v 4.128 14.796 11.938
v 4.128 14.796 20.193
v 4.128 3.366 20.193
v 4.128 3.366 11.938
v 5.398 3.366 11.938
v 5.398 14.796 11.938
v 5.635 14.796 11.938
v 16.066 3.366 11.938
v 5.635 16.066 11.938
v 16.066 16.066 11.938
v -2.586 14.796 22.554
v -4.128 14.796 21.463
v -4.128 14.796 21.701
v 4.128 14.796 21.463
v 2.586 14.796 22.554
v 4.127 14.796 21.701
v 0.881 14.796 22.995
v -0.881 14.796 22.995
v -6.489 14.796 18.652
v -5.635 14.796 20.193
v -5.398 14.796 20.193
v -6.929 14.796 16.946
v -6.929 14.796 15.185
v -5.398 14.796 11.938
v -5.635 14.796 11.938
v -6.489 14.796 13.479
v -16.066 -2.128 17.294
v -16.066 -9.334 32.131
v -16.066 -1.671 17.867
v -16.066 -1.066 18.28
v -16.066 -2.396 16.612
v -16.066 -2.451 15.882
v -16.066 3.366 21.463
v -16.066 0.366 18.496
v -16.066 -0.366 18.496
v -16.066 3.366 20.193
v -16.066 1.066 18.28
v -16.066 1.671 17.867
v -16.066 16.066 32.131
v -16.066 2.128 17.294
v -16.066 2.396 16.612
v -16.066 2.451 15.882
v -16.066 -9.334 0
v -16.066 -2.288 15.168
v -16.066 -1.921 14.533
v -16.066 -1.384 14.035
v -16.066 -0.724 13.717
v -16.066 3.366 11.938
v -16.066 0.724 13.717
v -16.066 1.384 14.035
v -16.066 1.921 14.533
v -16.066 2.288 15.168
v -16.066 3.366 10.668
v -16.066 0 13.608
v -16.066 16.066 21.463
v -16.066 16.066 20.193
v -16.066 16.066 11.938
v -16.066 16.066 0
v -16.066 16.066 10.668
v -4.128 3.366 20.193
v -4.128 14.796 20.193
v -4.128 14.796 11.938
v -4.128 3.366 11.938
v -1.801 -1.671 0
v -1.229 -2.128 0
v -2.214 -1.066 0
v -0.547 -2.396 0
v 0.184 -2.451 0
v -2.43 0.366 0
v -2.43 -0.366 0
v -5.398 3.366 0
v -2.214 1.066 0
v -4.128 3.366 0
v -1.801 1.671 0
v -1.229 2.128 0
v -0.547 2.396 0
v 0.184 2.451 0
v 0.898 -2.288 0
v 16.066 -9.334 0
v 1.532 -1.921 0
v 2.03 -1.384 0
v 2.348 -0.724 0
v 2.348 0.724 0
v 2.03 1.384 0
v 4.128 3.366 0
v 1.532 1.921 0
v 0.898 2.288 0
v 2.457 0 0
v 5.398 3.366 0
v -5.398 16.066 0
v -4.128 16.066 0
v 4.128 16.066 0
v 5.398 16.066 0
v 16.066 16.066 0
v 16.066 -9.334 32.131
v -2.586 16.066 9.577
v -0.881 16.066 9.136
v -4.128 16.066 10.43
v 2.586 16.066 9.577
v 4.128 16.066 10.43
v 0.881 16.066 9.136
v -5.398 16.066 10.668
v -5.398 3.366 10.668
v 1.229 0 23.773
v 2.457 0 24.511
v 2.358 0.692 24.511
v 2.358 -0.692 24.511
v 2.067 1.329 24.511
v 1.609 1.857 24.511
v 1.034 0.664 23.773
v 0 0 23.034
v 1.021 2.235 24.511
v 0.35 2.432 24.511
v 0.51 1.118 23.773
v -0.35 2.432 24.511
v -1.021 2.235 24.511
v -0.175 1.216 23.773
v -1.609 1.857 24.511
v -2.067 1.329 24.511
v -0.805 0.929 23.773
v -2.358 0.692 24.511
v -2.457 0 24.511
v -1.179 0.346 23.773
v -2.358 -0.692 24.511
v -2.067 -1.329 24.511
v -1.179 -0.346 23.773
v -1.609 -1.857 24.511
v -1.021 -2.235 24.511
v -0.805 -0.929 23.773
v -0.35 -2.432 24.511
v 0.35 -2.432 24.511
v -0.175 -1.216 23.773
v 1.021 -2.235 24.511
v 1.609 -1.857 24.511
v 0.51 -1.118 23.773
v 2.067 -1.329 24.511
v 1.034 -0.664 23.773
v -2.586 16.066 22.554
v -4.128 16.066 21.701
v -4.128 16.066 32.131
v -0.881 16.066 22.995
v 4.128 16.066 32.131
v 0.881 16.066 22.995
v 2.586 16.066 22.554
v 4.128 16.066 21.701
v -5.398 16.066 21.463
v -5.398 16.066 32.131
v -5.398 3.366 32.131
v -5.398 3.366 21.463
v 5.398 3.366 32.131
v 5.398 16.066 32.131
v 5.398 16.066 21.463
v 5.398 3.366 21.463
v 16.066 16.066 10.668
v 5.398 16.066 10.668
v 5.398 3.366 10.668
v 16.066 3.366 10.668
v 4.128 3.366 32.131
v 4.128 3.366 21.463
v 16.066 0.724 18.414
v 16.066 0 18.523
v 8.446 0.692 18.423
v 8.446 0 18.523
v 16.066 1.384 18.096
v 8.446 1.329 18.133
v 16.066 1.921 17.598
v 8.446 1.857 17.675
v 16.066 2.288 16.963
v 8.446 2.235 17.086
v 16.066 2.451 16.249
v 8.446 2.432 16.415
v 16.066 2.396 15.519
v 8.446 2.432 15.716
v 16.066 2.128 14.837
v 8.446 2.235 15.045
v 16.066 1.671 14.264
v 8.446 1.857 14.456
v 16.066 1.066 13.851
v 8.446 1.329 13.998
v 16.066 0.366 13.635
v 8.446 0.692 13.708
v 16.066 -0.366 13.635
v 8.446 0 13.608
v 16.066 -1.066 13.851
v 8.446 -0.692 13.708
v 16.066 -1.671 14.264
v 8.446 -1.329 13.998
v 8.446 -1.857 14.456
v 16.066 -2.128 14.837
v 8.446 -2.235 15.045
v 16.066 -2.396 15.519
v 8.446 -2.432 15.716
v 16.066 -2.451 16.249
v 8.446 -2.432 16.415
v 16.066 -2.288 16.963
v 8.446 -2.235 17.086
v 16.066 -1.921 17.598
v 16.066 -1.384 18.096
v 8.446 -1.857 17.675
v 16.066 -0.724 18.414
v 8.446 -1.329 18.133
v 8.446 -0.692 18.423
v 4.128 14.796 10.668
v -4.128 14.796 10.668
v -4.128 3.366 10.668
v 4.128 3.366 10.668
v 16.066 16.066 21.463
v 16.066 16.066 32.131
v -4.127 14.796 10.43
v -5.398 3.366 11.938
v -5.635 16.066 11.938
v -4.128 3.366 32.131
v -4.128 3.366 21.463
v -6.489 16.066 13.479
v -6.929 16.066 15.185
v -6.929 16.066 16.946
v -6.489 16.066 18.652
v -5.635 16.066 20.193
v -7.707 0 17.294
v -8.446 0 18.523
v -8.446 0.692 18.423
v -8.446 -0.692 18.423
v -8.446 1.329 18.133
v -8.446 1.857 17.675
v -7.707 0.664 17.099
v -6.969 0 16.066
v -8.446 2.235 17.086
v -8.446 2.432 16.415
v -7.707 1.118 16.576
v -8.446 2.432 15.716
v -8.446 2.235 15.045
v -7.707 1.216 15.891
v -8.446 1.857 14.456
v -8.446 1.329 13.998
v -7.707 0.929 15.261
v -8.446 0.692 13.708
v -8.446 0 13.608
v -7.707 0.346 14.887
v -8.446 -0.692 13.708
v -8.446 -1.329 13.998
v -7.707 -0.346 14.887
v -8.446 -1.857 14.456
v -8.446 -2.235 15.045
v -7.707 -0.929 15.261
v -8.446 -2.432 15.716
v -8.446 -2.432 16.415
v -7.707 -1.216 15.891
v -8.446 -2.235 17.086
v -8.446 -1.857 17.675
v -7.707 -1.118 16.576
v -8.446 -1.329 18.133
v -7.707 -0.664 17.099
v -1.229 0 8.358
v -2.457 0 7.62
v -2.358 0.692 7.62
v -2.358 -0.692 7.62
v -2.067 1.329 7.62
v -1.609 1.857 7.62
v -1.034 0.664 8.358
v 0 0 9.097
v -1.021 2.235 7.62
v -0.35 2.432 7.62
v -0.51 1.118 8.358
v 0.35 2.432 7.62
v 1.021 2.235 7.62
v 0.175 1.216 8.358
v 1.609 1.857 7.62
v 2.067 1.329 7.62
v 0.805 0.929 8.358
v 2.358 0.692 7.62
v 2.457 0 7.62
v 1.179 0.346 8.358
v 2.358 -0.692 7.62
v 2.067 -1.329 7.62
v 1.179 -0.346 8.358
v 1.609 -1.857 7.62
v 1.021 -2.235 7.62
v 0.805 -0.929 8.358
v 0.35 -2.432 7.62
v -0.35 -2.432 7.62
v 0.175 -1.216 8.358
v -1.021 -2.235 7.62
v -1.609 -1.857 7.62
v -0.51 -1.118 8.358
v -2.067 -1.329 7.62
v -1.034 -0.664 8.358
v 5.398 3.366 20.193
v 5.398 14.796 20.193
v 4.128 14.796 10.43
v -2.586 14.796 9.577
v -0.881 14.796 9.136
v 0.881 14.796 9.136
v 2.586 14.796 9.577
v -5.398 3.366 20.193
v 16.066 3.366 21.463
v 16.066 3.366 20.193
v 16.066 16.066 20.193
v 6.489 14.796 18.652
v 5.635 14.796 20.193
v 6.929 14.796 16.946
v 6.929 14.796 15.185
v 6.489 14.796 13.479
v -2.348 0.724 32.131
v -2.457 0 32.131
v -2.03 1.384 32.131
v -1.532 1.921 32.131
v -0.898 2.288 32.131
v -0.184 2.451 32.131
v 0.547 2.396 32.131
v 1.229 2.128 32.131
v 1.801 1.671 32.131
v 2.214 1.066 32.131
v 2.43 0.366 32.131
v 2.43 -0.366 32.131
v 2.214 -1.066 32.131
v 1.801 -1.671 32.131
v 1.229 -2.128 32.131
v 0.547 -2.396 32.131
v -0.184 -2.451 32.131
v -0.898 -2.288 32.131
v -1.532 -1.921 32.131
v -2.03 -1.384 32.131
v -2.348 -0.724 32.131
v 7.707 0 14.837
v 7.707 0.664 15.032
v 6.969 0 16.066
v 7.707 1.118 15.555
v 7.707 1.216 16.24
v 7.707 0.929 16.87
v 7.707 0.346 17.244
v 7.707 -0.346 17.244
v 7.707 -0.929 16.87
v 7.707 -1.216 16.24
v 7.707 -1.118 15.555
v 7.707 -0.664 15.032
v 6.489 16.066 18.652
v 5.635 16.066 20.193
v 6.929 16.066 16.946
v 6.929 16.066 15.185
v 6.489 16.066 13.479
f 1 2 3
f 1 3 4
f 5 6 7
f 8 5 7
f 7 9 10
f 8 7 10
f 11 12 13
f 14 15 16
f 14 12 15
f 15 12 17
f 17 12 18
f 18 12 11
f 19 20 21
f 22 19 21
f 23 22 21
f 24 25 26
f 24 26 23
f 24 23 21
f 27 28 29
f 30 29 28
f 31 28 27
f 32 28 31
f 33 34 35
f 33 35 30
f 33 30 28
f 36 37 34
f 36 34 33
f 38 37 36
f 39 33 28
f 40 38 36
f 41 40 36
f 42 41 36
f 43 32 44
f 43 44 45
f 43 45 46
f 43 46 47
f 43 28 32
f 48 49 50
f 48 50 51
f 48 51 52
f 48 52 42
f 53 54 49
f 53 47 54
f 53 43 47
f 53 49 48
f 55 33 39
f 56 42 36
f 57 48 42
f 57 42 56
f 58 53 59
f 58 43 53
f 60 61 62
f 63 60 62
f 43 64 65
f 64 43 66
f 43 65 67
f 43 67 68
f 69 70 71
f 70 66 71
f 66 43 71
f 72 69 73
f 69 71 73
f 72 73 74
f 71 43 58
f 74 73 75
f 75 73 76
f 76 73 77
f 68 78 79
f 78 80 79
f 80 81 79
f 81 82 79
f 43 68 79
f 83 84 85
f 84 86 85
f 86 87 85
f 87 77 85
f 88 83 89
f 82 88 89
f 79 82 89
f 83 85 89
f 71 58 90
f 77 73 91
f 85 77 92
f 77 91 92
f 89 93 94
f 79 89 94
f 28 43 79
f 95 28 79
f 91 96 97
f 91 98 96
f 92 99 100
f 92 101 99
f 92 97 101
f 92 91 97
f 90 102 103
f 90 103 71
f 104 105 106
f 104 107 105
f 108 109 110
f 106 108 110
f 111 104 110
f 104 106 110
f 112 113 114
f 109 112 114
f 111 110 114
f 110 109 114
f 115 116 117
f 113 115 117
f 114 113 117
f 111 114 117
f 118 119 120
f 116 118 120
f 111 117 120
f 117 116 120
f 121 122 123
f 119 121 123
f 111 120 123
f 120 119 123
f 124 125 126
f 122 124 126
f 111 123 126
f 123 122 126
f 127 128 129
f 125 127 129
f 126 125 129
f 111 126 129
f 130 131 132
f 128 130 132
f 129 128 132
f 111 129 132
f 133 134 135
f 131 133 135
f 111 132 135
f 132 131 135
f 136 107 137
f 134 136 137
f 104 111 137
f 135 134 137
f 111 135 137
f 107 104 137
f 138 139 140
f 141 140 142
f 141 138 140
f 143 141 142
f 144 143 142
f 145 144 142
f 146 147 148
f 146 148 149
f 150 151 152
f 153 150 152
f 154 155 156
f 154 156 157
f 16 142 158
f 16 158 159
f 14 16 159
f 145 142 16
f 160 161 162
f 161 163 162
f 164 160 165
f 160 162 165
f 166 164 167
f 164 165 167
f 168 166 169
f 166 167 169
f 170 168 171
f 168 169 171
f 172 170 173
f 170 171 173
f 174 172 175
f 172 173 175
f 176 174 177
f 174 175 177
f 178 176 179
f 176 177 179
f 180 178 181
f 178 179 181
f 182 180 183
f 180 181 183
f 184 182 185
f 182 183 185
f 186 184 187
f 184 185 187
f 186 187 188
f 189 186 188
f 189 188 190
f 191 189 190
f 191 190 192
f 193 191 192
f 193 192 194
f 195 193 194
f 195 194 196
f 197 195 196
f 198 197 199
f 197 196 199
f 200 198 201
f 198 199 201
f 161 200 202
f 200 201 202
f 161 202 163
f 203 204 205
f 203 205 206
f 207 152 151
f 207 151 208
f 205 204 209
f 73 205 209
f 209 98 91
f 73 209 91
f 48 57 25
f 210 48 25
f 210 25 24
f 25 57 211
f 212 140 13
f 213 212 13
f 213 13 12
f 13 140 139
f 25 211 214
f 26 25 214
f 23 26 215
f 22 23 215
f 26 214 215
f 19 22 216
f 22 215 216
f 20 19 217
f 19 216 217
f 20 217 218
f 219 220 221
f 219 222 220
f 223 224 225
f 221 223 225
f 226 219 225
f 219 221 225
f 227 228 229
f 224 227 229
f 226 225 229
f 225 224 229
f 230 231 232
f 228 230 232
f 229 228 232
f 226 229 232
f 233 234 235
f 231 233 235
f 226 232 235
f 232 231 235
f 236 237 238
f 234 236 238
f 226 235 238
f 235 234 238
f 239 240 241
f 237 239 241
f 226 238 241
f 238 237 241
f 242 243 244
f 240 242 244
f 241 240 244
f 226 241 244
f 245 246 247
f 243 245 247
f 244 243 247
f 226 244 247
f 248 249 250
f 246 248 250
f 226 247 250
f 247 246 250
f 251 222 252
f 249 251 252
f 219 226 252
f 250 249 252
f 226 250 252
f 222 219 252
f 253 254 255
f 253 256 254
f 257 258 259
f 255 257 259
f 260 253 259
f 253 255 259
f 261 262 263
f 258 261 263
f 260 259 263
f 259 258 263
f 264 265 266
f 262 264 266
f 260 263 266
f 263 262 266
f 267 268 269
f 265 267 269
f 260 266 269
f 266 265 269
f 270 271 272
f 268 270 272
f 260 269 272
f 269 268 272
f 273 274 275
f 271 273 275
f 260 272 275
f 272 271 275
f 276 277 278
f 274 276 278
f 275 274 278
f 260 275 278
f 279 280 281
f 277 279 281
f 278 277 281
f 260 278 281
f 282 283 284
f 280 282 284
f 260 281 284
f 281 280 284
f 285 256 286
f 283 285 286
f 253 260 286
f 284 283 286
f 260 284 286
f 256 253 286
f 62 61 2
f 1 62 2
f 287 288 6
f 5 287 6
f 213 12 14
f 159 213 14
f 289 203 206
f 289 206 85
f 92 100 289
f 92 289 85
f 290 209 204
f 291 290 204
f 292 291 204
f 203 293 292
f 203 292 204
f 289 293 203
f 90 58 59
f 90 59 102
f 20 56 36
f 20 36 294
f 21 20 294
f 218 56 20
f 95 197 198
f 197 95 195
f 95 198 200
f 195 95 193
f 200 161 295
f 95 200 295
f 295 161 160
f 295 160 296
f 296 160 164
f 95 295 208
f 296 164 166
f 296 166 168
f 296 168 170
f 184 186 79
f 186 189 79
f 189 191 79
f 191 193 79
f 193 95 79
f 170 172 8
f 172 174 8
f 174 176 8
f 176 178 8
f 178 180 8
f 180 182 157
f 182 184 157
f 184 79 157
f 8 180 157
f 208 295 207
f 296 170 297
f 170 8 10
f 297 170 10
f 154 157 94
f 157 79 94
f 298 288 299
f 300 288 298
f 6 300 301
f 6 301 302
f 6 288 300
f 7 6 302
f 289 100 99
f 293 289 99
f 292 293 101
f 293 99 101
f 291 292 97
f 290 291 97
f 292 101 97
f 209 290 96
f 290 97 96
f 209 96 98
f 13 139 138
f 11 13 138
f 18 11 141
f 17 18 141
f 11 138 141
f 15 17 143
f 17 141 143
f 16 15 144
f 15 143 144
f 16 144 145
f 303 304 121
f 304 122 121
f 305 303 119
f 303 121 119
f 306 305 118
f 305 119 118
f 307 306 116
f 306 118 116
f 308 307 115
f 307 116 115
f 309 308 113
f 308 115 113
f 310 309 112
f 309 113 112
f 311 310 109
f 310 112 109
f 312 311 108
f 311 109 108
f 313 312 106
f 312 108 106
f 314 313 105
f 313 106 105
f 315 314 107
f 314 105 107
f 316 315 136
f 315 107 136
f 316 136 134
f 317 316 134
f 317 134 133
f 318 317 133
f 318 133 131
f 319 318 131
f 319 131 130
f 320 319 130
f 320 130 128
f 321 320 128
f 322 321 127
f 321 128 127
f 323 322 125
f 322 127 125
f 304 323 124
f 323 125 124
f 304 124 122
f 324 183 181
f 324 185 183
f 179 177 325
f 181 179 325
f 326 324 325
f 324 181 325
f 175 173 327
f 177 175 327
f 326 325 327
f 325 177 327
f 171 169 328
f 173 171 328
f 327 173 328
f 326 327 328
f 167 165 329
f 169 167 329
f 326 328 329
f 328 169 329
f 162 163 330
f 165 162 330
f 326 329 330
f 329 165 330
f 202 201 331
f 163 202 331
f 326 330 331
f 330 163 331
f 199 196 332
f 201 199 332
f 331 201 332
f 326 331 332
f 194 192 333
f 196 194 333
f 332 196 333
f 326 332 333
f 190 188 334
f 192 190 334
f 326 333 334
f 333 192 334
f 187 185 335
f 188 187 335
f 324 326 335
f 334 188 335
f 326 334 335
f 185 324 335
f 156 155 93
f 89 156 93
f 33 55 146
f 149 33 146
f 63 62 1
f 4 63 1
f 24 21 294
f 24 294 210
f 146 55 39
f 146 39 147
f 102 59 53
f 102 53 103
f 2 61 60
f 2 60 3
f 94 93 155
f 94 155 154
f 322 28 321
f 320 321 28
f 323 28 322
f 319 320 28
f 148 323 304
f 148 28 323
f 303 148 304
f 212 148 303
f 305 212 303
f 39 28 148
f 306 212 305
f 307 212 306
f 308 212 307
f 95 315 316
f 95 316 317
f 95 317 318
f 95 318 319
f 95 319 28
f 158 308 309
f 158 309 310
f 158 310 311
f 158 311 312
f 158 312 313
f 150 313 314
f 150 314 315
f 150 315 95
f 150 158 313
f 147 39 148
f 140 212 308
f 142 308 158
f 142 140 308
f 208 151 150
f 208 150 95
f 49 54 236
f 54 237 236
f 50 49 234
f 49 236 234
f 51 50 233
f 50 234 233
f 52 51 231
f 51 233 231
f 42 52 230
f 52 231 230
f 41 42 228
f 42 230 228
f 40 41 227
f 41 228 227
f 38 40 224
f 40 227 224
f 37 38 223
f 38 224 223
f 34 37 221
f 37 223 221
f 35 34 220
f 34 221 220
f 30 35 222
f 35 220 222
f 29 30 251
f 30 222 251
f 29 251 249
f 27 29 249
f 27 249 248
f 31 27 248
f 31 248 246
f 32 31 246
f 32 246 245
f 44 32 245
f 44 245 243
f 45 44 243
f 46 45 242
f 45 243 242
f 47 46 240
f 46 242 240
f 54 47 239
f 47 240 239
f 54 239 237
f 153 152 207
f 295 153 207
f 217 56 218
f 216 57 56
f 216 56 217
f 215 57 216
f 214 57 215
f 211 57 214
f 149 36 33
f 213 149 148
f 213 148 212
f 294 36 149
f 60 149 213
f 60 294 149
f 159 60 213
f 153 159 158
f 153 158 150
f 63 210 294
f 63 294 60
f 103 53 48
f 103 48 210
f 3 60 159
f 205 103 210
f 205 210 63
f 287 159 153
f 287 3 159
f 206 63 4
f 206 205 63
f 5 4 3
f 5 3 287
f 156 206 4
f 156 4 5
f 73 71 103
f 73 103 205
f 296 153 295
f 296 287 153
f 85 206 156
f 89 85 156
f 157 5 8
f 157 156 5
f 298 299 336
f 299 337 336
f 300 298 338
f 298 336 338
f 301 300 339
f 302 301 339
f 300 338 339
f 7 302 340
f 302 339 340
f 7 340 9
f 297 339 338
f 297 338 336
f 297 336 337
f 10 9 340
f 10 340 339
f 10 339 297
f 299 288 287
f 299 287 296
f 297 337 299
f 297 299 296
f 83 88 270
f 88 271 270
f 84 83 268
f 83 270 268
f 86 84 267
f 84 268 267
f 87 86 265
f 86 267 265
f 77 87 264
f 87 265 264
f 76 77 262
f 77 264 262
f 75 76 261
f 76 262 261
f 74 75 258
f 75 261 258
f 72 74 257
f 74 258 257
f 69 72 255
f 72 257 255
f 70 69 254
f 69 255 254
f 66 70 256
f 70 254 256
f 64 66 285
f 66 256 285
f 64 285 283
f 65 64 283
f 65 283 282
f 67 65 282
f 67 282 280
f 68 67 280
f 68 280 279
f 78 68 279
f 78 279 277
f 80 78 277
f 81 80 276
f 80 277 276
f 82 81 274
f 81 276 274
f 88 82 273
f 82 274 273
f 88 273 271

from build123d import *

# Parameters (mm, degrees)
SKETCH1_W                        = 32.131
SKETCH1_H                        = 25.4
BOSS_EXTRUDE1_DEPTH              = 32.131
SKETCH2_W                        = 1.27
SKETCH2_H                        = 32.131
SKETCH2_W_2                      = 32.131
SKETCH2_H_2                      = 1.27
CUT_EXTRUDE1_DEPTH               = 12.7
SKETCH3_R                        = 6.985
CUT_EXTRUDE2_DEPTH               = 1.27
F_10_0_1935_DIAMETER_HOLE6_D     = 4.9149
F_10_0_1935_DIAMETER_HOLE6_DEPTH = 7.62
F_10_0_1935_DIAMETER_HOLE6_TIP   = 1.476584928
F_10_0_1935_DIAMETER_HOLE7_D     = 4.9149
F_10_0_1935_DIAMETER_HOLE7_DEPTH = 7.62
F_10_0_1935_DIAMETER_HOLE7_TIP   = 1.476584928
F_10_0_1935_DIAMETER_HOLE8_D     = 4.9149
F_10_0_1935_DIAMETER_HOLE8_DEPTH = 7.62
F_10_0_1935_DIAMETER_HOLE8_TIP   = 1.476584928
F_10_0_1935_DIAMETER_HOLE9_D     = 4.9149
F_10_0_1935_DIAMETER_HOLE9_DEPTH = 7.62
F_10_0_1935_DIAMETER_HOLE9_TIP   = 1.476584928


with BuildPart() as part:
    # Sketch1 → Boss-Extrude1 (new body)
    with BuildSketch(Plane.XY):
        with Locations((0, 3.3655)):
            Rectangle(SKETCH1_W, SKETCH1_H)
    extrude(amount=BOSS_EXTRUDE1_DEPTH)

    # Sketch2 → Cut-Extrude1 (cut)
    with BuildSketch(Plane(origin=(0, 16.0655, 0), x_dir=(1, 0, 0), z_dir=(0, 1, 0))):
        with Locations((-4.7625, -16.0655)):
            Rectangle(SKETCH2_W, SKETCH2_H)
        with Locations((4.7625, -16.0655)):
            Rectangle(SKETCH2_W, SKETCH2_H)
        with Locations((0, -11.303)):
            Rectangle(SKETCH2_W_2, SKETCH2_H_2)
        with Locations((0, -20.828)):
            Rectangle(SKETCH2_W_2, SKETCH2_H_2)
    extrude(amount=-CUT_EXTRUDE1_DEPTH, mode=Mode.SUBTRACT)

    # Sketch3 → Cut-Extrude2 (cut)
    with BuildSketch(Plane(origin=(0, 16.0655, 0), x_dir=(1, 0, 0), z_dir=(0, 1, 0))):
        with Locations((0, -16.0655)):
            Circle(SKETCH3_R)
    extrude(amount=-CUT_EXTRUDE2_DEPTH, mode=Mode.SUBTRACT)

    # #10 (0.1935) Diameter Hole6
    with Locations(Plane.XY.offset(32.131)):
        with Locations((0, 0)):
            Hole(F_10_0_1935_DIAMETER_HOLE6_D / 2, depth=F_10_0_1935_DIAMETER_HOLE6_DEPTH)
            with Locations((0, 0, -(F_10_0_1935_DIAMETER_HOLE6_DEPTH + F_10_0_1935_DIAMETER_HOLE6_TIP / 2))):  # 118° drill point
                Cone(0, F_10_0_1935_DIAMETER_HOLE6_D / 2, F_10_0_1935_DIAMETER_HOLE6_TIP, mode=Mode.SUBTRACT)

    # #10 (0.1935) Diameter Hole7
    with Locations(Plane(origin=(0, 0, 0), x_dir=(-1, 0, 0), z_dir=(0, 0, -1))):
        with Locations((0, 0)):
            Hole(F_10_0_1935_DIAMETER_HOLE7_D / 2, depth=F_10_0_1935_DIAMETER_HOLE7_DEPTH)
            with Locations((0, 0, -(F_10_0_1935_DIAMETER_HOLE7_DEPTH + F_10_0_1935_DIAMETER_HOLE7_TIP / 2))):  # 118° drill point
                Cone(0, F_10_0_1935_DIAMETER_HOLE7_D / 2, F_10_0_1935_DIAMETER_HOLE7_TIP, mode=Mode.SUBTRACT)

    # #10 (0.1935) Diameter Hole8
    with Locations(Plane(origin=(16.0655, 0, 0), x_dir=(0, 0, -1), z_dir=(1, 0, 0))):
        with Locations((-16.0655, 0)):
            Hole(F_10_0_1935_DIAMETER_HOLE8_D / 2, depth=F_10_0_1935_DIAMETER_HOLE8_DEPTH)
            with Locations((0, 0, -(F_10_0_1935_DIAMETER_HOLE8_DEPTH + F_10_0_1935_DIAMETER_HOLE8_TIP / 2))):  # 118° drill point
                Cone(0, F_10_0_1935_DIAMETER_HOLE8_D / 2, F_10_0_1935_DIAMETER_HOLE8_TIP, mode=Mode.SUBTRACT)

    # #10 (0.1935) Diameter Hole9
    with Locations(Plane.ZY.offset(16.0655)):
        with Locations((16.0655, 0)):
            Hole(F_10_0_1935_DIAMETER_HOLE9_D / 2, depth=F_10_0_1935_DIAMETER_HOLE9_DEPTH)
            with Locations((0, 0, -(F_10_0_1935_DIAMETER_HOLE9_DEPTH + F_10_0_1935_DIAMETER_HOLE9_TIP / 2))):  # 118° drill point
                Cone(0, F_10_0_1935_DIAMETER_HOLE9_D / 2, F_10_0_1935_DIAMETER_HOLE9_TIP, mode=Mode.SUBTRACT)


solid = part.part
